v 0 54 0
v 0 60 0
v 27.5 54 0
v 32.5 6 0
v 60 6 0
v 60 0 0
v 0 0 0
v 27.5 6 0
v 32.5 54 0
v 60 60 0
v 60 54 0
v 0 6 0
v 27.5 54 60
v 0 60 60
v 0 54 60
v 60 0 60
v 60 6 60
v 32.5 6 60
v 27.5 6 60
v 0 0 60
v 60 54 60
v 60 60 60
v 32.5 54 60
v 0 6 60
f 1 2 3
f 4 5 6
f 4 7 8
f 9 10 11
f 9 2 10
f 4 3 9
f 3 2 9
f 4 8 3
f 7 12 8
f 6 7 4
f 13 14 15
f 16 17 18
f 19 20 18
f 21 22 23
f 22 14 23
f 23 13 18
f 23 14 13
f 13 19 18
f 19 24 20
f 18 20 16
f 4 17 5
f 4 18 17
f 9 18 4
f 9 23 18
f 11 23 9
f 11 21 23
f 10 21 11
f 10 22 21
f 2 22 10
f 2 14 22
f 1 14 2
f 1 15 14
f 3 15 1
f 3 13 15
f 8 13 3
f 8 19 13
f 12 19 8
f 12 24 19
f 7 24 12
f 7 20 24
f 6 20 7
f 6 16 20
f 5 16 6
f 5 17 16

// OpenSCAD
$fn = 32;

// ----------------------------------------------------------------------
// Structural section: ibeam 60 x 60 mm
// ----------------------------------------------------------------------

// --- parameters (mm) ---
sec_w = 60;               // section width, X
sec_h = 60;               // section height, Y
flange_t = 6;             // flange thickness
web_t = 5;                // web thickness
plate_t = 60;             // cut length, Z (extrusion height)

profile = [[0, 0], [60, 0], [60, 6], [32.5, 6], [32.5, 54], [60, 54], [60, 60], [0, 60], [0, 54], [27.5, 54], [27.5, 6], [0, 6]];  // primary outline, 12 points, counter clockwise

// --- the one profile operation ---
linear_extrude(height = plate_t) polygon(points = profile);
